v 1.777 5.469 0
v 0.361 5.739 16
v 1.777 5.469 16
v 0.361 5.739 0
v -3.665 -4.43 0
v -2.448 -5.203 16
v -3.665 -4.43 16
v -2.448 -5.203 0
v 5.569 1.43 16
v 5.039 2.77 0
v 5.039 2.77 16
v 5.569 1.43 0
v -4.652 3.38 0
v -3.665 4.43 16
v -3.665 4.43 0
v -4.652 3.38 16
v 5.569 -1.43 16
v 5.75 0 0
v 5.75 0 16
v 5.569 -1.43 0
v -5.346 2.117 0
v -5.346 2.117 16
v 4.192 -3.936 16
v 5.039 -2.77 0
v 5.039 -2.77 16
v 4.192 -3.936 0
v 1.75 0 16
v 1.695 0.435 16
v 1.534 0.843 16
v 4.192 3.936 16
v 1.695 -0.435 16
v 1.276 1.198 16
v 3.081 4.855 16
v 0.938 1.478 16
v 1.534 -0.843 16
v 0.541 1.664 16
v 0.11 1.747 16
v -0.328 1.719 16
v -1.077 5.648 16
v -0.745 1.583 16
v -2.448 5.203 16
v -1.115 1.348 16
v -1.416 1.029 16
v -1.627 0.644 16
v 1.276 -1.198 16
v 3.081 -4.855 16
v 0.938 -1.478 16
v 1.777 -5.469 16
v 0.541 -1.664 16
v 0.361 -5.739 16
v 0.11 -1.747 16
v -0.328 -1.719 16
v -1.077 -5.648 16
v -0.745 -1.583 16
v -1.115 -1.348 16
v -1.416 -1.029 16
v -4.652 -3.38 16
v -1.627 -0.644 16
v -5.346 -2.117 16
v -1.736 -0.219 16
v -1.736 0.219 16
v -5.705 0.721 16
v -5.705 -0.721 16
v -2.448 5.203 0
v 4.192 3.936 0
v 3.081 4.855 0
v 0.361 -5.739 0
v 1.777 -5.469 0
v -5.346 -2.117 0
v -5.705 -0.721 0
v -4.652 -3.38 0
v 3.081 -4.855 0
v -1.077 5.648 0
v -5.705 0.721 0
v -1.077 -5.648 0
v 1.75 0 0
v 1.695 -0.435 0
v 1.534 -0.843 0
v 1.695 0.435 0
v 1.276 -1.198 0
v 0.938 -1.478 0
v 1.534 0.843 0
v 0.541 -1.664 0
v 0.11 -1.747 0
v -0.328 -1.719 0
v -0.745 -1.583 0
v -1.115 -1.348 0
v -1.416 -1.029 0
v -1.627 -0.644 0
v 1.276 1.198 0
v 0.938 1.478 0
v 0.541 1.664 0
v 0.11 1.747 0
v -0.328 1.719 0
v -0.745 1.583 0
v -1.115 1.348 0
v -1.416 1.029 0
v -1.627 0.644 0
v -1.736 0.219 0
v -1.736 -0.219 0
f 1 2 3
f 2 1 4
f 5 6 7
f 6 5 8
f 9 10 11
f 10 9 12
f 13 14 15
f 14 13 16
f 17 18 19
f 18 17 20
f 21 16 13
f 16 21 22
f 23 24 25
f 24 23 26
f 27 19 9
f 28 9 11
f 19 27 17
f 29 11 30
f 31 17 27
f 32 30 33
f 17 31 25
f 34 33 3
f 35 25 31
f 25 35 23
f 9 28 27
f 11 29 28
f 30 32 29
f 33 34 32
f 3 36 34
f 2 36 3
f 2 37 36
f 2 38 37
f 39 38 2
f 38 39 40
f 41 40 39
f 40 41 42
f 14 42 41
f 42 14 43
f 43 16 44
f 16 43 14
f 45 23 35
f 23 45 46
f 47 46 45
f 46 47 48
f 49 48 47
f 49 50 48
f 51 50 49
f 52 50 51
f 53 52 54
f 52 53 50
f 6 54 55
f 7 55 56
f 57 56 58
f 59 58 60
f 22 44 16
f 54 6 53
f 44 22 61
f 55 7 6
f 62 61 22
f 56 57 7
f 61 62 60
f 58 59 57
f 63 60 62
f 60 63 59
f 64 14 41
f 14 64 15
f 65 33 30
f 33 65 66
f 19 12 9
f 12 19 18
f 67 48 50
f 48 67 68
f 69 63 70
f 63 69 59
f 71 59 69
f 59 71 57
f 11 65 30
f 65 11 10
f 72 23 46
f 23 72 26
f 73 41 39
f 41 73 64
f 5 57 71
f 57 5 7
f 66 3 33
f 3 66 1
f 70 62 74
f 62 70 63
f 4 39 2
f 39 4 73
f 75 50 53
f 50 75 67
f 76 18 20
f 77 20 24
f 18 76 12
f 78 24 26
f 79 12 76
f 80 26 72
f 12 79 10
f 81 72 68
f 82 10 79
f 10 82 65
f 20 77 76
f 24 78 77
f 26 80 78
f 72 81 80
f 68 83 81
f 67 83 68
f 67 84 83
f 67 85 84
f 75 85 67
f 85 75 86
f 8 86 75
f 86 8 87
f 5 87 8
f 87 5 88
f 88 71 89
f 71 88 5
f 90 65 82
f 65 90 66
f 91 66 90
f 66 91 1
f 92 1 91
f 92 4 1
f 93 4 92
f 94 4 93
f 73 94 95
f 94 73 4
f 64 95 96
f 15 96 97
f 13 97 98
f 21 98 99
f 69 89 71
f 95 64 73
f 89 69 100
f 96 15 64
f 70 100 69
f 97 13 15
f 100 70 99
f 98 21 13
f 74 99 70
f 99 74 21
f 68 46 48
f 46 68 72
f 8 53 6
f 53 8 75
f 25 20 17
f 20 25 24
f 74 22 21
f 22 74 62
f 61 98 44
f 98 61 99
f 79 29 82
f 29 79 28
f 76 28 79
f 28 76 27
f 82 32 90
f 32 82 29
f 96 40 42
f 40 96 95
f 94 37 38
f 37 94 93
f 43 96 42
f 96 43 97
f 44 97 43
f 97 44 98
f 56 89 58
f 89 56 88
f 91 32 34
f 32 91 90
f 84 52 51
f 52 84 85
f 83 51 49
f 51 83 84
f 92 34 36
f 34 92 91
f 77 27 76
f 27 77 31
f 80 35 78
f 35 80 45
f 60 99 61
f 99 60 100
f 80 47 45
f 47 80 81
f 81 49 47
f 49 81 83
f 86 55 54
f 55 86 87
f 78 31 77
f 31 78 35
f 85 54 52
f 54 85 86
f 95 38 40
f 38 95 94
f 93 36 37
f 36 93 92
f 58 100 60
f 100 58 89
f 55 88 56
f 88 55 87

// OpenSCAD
// ========================================================================================
// Robori Mendel
// Y motor spacer
// GNU GPL v3
//
// Contact : support@robori.com
// Reference : http://www.robori.com/documentation/Mendel
//
// History :
// 28 Jan 2015 - First version
// ========================================================================================

$fn = 25;

y_motor_spacer();

module y_motor_spacer()
{
	spacer_h = 16;
	id = 3 + 0.5;
	od = id + 2*4;

	difference()
	{
		cylinder(h=spacer_h, r=od/2, center=false);
		translate([0, 0, -1]) cylinder(h=spacer_h + 2, r=id/2, center=false);
	}
}
